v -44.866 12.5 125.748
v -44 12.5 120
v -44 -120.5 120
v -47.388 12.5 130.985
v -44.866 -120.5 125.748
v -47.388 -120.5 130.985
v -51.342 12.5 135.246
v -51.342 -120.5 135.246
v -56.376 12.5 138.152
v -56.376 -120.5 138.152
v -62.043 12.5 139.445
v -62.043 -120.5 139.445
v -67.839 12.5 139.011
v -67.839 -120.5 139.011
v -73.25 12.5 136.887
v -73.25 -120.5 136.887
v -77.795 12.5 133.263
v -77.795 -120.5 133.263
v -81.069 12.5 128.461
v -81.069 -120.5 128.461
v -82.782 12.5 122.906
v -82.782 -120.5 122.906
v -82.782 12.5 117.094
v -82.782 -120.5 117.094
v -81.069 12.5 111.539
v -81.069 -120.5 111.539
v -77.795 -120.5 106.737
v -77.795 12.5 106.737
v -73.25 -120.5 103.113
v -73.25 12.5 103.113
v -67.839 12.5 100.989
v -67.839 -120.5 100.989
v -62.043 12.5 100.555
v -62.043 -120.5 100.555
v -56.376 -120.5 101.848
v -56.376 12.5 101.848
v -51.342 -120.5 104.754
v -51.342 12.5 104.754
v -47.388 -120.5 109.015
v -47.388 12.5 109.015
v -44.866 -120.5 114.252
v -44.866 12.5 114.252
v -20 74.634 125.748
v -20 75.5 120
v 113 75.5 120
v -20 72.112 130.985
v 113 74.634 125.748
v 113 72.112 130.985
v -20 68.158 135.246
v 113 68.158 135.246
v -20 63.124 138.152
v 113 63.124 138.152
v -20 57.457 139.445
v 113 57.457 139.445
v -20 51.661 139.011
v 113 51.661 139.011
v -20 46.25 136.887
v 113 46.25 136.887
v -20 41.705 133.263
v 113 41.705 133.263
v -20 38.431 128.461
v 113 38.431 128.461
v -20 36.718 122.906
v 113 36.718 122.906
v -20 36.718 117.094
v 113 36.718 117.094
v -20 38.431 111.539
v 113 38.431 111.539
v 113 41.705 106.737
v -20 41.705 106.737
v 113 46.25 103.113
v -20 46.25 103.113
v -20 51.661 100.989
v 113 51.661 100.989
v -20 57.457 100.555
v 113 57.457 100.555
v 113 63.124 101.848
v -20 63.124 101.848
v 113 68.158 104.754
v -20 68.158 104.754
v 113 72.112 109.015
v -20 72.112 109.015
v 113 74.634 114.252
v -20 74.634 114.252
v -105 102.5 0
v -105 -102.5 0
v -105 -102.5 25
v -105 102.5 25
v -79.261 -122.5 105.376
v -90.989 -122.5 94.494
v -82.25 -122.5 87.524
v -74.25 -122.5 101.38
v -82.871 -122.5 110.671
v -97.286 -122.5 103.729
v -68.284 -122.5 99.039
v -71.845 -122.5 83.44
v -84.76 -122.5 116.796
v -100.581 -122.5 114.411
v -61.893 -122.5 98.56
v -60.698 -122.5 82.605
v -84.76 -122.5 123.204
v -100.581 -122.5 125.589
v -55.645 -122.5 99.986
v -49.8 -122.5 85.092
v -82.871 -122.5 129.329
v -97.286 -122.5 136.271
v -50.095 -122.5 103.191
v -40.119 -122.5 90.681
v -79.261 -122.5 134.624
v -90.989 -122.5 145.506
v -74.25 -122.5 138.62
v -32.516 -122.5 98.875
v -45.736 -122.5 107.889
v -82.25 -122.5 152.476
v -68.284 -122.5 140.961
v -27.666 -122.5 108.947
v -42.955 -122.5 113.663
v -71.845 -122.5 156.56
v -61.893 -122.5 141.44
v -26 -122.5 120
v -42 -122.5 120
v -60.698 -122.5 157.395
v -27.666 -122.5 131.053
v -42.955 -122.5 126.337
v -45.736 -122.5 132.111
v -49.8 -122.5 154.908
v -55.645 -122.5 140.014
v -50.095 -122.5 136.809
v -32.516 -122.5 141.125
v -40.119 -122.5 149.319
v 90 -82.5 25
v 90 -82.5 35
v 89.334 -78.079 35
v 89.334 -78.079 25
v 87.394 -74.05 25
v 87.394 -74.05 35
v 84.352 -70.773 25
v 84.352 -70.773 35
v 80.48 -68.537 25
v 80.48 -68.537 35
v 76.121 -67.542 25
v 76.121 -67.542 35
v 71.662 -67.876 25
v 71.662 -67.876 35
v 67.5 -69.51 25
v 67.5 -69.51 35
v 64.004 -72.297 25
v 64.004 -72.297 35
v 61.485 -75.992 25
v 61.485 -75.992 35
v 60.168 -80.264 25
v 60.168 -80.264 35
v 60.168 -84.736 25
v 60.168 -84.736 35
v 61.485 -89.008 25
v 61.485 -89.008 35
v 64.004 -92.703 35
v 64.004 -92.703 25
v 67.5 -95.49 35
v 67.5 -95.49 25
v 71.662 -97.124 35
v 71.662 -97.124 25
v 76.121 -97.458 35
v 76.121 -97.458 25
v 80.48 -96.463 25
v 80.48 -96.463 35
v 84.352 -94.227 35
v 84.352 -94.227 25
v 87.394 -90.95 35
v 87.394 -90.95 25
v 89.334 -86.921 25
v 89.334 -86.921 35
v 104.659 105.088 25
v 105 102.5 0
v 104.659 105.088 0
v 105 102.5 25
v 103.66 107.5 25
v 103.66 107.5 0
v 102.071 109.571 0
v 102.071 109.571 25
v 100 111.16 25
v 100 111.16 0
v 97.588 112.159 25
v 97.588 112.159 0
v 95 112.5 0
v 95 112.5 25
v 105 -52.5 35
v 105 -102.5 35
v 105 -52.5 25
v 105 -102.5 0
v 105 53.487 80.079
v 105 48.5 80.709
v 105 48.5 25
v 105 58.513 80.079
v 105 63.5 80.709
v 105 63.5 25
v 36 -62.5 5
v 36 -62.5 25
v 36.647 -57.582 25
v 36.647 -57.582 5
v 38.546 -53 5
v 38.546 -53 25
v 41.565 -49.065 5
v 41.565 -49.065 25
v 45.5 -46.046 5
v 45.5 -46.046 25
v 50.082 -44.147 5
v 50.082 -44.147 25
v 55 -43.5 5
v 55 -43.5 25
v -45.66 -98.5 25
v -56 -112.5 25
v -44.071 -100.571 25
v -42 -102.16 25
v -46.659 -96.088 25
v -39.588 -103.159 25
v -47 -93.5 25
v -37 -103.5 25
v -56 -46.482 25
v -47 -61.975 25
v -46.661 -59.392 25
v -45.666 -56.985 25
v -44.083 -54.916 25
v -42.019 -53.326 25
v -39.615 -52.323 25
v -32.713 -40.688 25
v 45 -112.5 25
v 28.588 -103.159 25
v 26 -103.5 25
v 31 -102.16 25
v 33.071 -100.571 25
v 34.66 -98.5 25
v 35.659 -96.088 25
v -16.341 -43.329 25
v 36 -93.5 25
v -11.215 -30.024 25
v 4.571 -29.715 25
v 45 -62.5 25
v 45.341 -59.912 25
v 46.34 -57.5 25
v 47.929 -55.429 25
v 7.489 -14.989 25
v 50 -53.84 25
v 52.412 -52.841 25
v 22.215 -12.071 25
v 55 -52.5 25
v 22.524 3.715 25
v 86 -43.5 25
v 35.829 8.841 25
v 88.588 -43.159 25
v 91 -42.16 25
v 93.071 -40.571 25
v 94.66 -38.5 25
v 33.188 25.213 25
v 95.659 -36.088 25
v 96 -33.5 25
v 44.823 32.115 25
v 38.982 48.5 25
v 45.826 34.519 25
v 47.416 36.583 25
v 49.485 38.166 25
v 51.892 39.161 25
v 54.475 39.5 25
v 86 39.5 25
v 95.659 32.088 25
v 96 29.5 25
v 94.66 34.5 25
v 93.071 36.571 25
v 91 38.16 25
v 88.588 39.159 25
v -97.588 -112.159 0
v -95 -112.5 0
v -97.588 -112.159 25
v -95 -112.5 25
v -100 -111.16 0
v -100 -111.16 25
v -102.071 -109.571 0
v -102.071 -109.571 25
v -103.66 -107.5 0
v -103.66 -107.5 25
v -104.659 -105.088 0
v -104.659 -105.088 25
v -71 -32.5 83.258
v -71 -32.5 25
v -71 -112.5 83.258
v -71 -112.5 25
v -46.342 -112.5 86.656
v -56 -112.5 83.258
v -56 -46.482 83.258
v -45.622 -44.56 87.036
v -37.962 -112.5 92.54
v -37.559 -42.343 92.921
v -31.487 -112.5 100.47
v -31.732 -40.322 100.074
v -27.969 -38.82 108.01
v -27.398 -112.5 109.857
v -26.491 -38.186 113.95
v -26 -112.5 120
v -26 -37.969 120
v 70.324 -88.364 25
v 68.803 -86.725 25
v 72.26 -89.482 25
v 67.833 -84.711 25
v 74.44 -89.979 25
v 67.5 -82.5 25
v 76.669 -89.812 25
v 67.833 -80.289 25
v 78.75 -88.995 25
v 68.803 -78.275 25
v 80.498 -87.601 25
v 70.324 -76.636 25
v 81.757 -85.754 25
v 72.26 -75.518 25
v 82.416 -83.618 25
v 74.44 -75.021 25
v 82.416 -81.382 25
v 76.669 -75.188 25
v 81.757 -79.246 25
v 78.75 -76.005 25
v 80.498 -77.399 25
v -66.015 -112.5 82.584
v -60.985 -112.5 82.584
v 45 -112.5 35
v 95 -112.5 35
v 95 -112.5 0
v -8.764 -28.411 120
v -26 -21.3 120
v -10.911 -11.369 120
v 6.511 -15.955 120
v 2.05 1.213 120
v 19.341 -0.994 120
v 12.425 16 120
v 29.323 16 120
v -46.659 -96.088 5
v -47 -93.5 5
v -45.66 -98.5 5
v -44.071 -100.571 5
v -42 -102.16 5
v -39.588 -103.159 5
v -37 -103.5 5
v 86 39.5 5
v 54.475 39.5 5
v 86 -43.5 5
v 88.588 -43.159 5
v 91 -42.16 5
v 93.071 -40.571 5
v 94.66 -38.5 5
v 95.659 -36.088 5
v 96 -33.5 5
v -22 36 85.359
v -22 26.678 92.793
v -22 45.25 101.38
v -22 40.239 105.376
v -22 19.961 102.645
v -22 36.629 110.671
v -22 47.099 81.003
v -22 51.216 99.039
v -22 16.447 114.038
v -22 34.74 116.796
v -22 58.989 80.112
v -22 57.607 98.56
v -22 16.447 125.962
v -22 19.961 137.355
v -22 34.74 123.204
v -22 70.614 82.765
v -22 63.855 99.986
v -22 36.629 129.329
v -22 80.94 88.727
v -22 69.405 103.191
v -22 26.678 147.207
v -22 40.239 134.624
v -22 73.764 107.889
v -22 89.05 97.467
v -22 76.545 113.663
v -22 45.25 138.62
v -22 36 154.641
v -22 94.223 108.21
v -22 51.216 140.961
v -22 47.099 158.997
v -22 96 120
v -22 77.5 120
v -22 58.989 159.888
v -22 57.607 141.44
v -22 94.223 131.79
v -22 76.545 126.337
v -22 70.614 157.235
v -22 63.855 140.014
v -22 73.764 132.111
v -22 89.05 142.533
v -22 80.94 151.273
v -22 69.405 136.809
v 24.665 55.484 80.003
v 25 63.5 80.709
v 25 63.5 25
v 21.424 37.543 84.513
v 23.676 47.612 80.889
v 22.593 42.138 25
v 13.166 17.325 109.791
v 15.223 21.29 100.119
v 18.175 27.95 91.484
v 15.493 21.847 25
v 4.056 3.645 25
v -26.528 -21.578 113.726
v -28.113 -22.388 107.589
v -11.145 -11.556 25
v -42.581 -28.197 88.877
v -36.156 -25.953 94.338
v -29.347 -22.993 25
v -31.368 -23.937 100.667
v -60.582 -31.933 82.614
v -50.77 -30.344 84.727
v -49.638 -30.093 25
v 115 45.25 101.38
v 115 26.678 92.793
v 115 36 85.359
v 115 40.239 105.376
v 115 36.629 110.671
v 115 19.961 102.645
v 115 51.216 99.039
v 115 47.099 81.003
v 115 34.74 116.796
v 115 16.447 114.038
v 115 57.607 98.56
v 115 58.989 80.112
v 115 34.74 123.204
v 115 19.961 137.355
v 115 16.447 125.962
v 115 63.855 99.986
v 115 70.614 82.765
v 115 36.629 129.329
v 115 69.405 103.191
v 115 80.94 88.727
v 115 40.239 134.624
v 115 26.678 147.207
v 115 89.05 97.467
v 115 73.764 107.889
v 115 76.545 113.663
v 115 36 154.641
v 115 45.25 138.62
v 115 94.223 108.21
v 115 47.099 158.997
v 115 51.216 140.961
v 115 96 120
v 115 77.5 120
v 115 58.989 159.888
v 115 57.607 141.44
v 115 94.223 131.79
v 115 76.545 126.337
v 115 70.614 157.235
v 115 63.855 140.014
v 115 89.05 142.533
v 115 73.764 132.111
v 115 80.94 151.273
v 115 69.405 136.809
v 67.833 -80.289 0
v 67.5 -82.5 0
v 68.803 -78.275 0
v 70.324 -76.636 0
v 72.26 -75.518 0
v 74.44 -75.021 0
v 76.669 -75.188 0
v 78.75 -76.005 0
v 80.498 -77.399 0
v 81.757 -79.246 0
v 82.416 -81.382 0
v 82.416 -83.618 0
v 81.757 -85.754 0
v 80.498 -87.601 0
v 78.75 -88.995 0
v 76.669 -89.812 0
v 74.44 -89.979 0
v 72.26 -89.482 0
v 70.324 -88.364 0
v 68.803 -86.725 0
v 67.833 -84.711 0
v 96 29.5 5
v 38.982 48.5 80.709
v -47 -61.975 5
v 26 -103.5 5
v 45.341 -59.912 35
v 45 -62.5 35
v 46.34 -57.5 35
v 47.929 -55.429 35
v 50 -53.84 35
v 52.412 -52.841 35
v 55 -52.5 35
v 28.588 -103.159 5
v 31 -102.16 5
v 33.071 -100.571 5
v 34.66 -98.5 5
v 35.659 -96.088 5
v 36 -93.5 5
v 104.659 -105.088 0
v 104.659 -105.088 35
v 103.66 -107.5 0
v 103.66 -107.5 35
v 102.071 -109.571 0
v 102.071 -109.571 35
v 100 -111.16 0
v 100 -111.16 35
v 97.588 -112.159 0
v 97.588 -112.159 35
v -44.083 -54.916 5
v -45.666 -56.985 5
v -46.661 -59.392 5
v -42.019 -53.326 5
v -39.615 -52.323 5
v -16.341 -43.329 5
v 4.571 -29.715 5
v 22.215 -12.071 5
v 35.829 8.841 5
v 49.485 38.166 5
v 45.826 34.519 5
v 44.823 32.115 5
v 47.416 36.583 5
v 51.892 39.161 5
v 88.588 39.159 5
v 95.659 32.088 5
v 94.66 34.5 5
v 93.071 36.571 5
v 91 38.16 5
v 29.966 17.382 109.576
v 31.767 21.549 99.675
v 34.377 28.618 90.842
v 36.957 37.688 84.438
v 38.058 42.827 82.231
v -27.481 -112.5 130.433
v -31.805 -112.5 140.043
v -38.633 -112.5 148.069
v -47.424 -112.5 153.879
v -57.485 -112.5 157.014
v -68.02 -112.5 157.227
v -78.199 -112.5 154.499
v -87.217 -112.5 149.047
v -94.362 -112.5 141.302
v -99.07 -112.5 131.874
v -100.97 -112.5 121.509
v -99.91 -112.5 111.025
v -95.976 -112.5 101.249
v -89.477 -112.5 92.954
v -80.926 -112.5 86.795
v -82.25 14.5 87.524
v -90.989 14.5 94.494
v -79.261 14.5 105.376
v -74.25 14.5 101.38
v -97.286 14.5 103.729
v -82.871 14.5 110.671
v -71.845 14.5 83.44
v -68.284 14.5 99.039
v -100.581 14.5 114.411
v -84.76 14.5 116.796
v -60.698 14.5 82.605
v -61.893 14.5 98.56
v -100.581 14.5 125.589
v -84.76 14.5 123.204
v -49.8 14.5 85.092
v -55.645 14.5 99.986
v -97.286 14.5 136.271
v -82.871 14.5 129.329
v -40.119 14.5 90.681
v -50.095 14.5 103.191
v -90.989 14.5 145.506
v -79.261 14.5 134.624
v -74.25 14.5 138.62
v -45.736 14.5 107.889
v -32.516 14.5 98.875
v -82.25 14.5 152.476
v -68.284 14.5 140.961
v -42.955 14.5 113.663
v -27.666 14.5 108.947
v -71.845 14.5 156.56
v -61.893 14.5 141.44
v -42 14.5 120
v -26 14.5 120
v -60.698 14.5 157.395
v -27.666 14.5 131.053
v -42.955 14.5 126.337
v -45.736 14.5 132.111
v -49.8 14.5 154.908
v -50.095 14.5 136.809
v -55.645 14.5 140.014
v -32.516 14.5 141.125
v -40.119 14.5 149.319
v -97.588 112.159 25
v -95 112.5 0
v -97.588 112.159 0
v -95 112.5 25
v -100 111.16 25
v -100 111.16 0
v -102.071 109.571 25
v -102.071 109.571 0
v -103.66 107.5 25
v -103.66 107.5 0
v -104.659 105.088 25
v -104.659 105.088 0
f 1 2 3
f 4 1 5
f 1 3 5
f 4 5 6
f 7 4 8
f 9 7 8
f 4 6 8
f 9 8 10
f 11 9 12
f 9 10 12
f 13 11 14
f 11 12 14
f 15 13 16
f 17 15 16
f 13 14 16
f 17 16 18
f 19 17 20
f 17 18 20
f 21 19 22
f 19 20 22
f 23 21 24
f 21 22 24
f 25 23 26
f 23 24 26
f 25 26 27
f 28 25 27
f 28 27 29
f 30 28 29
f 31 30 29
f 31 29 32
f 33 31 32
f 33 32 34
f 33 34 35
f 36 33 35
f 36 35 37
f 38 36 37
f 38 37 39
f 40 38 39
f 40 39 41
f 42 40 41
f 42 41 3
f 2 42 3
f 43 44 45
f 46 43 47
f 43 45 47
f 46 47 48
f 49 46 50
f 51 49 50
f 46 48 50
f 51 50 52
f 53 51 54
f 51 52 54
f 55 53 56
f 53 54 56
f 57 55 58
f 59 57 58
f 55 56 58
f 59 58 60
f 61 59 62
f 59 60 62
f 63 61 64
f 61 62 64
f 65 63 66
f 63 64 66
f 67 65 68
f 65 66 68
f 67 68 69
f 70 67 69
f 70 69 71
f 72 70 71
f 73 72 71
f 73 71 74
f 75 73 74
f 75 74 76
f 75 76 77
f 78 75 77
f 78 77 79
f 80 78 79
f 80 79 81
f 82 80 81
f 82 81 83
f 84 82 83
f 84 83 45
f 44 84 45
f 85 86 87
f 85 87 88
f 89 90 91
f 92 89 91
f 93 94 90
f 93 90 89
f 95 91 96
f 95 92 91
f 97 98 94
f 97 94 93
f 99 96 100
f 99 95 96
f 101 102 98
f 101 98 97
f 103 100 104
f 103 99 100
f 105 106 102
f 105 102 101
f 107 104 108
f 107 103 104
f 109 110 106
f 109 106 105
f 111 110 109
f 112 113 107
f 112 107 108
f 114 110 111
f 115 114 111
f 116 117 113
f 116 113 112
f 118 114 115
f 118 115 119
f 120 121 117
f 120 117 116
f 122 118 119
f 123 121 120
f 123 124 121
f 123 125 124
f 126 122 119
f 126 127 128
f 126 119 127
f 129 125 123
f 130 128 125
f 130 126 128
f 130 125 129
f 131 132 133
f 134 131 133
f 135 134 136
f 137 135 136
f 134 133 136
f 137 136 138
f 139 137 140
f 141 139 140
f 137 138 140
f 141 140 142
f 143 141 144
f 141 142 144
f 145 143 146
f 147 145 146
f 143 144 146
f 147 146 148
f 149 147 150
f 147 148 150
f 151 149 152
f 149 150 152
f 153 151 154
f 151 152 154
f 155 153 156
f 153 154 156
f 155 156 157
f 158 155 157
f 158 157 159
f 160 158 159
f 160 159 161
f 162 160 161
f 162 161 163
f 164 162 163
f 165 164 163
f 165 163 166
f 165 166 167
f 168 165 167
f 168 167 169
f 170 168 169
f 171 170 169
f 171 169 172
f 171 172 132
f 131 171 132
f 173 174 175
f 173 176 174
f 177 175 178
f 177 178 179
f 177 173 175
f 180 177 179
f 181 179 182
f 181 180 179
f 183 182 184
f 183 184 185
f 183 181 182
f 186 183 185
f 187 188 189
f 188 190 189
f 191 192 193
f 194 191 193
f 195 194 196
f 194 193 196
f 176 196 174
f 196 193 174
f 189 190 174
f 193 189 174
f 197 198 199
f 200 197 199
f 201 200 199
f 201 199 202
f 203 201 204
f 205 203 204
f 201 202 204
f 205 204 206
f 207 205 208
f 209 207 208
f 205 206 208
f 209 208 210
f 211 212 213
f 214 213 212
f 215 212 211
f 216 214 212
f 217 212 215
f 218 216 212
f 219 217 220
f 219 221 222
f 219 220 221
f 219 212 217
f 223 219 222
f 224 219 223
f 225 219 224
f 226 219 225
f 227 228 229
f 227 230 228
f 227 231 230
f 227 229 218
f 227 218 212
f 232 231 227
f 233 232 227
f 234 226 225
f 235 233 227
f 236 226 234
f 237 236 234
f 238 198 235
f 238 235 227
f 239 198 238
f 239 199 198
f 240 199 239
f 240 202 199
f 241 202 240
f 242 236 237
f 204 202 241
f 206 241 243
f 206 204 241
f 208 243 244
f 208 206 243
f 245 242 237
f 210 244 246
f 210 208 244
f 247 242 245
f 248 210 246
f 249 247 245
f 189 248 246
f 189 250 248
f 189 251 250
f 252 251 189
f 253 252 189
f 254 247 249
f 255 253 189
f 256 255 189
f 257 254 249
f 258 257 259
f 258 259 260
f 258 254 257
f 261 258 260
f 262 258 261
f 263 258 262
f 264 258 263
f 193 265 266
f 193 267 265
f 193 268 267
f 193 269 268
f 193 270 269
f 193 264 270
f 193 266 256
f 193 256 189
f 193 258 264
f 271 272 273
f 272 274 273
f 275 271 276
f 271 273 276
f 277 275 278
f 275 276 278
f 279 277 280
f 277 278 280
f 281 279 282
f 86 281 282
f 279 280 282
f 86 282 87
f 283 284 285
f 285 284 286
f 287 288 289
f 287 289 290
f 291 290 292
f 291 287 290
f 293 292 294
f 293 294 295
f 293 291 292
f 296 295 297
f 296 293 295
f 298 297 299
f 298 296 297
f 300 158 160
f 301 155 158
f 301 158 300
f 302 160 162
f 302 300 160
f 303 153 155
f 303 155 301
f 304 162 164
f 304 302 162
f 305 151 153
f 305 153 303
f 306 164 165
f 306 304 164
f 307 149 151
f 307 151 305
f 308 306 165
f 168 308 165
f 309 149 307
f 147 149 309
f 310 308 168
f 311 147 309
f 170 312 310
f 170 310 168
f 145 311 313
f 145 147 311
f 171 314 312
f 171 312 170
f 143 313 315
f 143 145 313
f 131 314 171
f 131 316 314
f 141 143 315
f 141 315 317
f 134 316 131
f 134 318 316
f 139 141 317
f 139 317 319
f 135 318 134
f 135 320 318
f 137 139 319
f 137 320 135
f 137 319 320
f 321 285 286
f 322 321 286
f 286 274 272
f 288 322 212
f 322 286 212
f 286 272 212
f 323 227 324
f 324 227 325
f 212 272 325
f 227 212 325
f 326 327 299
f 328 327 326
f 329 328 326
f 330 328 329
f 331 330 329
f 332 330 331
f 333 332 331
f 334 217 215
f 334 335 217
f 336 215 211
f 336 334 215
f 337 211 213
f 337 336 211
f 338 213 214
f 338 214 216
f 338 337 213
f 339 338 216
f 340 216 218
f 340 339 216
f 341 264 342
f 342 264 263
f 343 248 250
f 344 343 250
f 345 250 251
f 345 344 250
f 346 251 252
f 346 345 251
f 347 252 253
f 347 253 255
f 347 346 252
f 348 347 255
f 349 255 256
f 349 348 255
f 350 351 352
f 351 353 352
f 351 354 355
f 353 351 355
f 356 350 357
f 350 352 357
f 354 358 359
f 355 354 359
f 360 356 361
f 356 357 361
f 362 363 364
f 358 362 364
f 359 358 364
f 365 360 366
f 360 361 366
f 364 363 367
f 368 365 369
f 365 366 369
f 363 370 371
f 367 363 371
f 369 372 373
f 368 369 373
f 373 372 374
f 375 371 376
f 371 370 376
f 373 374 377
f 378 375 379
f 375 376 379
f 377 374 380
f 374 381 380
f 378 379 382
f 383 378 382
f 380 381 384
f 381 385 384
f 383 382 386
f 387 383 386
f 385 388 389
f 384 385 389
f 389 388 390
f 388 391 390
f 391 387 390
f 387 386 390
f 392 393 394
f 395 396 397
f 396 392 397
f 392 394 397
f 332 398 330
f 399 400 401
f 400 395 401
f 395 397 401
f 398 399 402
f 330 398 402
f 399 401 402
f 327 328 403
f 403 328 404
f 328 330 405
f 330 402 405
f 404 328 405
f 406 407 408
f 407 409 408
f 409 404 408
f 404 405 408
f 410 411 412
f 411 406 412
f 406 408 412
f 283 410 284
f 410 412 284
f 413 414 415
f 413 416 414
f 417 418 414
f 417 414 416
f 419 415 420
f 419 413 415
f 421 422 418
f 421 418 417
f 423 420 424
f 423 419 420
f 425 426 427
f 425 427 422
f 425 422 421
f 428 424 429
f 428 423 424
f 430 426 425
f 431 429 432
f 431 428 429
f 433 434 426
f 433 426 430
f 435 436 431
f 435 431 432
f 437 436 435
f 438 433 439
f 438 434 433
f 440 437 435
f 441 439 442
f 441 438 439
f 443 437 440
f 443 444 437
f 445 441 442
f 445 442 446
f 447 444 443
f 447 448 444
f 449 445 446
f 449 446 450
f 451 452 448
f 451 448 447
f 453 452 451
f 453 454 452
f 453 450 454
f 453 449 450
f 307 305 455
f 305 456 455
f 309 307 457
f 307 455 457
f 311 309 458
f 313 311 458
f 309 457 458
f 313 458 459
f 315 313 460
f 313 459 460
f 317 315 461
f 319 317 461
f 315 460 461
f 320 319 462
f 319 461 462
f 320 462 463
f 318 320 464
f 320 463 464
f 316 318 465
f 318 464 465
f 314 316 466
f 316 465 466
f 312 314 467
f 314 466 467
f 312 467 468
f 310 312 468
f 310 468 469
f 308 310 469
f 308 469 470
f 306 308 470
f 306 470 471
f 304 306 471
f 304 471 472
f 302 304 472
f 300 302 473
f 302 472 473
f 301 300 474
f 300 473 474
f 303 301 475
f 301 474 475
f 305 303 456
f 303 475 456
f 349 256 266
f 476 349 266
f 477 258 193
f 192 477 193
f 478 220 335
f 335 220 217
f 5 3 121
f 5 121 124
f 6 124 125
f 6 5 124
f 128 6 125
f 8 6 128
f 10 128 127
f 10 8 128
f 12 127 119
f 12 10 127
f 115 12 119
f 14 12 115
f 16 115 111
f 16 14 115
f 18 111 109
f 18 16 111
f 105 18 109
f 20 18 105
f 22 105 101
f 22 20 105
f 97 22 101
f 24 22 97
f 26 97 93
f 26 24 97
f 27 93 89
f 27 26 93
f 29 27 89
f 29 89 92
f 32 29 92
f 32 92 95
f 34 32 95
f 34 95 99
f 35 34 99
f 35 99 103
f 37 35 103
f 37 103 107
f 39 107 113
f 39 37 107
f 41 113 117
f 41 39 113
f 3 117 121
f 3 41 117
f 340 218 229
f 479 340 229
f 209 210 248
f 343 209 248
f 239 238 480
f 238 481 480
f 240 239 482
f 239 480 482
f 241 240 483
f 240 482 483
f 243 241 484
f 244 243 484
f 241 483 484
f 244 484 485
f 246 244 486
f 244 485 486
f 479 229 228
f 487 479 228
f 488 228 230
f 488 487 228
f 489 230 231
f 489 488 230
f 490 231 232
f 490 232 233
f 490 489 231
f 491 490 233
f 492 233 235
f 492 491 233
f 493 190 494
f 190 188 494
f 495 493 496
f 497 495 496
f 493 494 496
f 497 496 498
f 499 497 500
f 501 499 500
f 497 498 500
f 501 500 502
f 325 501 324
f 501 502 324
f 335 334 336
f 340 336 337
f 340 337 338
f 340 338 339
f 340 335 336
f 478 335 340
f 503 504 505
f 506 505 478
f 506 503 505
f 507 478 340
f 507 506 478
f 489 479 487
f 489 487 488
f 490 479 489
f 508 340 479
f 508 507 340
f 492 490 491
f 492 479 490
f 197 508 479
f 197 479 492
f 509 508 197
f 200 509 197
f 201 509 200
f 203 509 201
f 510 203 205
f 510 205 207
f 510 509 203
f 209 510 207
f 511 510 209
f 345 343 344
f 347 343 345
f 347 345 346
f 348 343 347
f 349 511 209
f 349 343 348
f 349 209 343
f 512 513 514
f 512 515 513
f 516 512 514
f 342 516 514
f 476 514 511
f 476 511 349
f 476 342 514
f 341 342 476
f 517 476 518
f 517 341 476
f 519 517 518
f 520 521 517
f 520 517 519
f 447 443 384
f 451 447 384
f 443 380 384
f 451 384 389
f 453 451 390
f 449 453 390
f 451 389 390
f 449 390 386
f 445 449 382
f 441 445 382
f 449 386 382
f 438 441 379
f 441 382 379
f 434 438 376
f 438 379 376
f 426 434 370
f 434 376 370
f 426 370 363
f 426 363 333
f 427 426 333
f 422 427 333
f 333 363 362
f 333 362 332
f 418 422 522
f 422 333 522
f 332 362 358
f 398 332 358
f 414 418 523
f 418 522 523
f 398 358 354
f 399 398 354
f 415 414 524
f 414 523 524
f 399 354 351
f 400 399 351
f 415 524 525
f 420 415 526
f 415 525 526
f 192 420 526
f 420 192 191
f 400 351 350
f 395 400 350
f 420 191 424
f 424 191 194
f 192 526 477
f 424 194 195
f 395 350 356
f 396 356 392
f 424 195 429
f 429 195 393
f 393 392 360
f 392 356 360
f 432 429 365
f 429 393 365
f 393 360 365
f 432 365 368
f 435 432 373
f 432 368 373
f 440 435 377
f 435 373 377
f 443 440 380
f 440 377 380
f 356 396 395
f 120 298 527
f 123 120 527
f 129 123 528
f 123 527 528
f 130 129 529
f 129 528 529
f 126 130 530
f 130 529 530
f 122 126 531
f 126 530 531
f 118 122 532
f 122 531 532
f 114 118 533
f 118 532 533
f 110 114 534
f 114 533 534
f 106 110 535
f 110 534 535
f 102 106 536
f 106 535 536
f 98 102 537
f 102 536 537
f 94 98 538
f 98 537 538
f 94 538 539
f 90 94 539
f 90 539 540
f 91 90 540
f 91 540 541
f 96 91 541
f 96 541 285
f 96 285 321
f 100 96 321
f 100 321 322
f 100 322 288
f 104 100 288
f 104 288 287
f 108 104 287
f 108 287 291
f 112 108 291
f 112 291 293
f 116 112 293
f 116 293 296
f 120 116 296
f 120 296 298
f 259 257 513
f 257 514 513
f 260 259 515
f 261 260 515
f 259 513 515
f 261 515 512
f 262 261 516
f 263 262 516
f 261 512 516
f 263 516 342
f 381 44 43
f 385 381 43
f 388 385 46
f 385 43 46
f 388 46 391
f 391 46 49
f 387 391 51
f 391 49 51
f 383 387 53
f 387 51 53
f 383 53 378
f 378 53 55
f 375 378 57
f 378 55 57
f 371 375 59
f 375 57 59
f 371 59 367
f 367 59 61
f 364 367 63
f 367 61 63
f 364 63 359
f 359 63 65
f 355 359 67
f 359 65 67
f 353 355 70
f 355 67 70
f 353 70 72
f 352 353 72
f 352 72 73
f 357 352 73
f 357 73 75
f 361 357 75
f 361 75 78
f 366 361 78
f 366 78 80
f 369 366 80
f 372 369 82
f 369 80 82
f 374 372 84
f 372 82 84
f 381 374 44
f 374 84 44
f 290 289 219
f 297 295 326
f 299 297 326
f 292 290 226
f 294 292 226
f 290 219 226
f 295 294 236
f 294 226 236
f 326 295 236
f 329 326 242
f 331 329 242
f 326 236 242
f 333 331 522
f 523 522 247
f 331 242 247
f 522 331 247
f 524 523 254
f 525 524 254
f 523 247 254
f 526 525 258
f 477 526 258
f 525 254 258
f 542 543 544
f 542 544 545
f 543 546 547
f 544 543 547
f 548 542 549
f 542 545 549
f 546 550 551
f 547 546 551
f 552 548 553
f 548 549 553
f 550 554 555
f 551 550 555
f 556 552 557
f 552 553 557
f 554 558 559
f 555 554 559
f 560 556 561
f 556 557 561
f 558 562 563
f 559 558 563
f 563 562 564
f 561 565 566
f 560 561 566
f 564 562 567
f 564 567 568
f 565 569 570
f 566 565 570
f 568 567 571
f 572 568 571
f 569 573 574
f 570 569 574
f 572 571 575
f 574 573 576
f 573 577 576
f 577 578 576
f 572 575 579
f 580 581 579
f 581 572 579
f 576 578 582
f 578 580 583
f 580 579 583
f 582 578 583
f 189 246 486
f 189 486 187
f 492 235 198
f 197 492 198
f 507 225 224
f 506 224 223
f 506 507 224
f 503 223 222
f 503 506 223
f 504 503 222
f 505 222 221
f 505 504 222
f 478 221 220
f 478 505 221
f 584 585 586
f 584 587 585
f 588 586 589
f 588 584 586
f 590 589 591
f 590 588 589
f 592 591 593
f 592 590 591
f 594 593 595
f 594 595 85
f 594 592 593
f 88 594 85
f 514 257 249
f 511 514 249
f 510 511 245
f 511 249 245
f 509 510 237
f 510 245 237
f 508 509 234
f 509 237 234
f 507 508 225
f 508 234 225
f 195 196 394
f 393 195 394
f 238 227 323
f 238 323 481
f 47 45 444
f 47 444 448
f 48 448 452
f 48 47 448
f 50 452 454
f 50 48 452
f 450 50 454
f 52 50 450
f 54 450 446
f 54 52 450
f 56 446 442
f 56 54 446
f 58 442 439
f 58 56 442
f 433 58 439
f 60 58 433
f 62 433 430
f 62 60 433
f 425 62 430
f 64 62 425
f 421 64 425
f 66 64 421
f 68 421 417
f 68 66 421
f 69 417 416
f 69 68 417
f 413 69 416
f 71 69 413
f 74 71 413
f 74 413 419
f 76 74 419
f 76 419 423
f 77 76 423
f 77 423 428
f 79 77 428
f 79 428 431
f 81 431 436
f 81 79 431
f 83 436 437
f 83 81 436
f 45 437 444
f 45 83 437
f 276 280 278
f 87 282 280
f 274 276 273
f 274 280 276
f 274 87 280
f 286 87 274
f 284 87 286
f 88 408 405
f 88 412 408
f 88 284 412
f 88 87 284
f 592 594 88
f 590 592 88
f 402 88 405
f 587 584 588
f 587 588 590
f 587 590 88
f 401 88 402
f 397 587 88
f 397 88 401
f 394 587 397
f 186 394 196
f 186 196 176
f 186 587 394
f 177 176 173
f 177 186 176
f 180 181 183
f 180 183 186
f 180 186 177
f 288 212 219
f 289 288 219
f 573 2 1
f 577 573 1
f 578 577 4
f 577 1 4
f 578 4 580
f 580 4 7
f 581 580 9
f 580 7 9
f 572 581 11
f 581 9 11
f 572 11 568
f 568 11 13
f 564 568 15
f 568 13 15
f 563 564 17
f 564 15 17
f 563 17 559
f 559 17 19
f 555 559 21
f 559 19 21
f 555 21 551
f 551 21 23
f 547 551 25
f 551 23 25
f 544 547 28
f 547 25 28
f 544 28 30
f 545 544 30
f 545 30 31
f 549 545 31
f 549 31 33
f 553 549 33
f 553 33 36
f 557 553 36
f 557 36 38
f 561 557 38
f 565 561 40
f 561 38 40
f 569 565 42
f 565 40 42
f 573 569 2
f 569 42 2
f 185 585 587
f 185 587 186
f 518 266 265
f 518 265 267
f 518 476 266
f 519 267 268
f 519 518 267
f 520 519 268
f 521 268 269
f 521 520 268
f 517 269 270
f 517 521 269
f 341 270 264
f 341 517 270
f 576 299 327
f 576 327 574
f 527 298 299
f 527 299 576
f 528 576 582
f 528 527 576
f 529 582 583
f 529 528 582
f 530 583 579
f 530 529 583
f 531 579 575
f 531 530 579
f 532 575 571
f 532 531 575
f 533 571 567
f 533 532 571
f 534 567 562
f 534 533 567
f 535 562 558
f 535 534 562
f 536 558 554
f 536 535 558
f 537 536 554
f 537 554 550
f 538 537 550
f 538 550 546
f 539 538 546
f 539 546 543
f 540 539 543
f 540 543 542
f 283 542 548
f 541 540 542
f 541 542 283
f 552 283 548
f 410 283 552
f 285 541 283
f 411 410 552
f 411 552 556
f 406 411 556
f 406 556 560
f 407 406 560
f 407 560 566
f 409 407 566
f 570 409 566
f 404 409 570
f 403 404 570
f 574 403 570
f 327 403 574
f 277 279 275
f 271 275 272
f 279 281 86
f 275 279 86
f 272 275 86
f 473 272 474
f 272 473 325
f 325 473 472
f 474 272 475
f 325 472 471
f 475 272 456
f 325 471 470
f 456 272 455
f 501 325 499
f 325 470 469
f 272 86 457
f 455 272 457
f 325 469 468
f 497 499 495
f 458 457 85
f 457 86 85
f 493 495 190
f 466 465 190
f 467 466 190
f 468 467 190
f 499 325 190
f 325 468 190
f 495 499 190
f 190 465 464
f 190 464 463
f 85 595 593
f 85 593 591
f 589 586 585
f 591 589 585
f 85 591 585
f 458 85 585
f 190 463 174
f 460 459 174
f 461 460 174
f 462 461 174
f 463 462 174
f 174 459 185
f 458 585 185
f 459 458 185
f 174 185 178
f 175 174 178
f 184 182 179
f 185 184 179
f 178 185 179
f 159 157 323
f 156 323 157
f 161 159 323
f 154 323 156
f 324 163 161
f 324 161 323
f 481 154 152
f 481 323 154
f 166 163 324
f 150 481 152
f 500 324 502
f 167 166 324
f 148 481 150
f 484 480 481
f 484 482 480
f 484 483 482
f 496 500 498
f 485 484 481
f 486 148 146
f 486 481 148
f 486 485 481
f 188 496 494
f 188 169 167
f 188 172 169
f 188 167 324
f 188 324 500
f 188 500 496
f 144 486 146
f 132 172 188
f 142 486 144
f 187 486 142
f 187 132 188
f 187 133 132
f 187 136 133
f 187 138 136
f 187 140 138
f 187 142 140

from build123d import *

# Parameters (mm, degrees)
F0_W            = 210
F0_H            = 225
F1_DEPTH        = 25
F3_DEPTH        = 95
F4_R            = 37.5
F5_DEPTH        = 10
F5_DEPTH_BACK   = 127
F6_R            = 40
F7_DEPTH        = 10
F7_DEPTH_BACK   = 127
F8_W            = 60
F8_H            = 60
F9_DEPTH        = 10
F10_R           = 10
F12_DEPTH       = 20
F14_D           = 15
F14_CBORE_D     = 30
F14_CBORE_DEPTH = 10
F15_R           = 10
F16_R           = 19.5
F17_DEPTH       = 235.001
F18_R           = 19.5
F19_DEPTH       = 220.001
F20_SIZE        = 2
F21_R           = 10


with BuildPart() as f1:
    # F0 (on Top) → F1 (new body)
    with BuildSketch(Plane.XY):
        Rectangle(F0_W, F0_H)
    extrude(amount=F1_DEPTH)

    # F2 (on face) → F3 (join)
    with BuildSketch(Plane.XY.offset(25)):
        with BuildLine():
            Line((-71, -32.5), (-71, -112.5))
            Line((-71, -112.5), (-56, -112.5))
            Line((-56, -112.5), (-56, -46.481817))
            ThreePointArc((-56, -46.481817), (7.488853, -14.988853), (38.981817, 48.5))
            Line((38.981817, 48.5), (105, 48.5))
            Line((105, 48.5), (105, 63.5))
            Line((105, 63.5), (25, 63.5))
            ThreePointArc((25, 63.5), (-3.117749, -4.382251), (-71, -32.5))
        make_face()
    extrude(amount=F3_DEPTH)

    # F4 (on face) → F5 (join, two sides)
    with BuildSketch(Plane.XZ.offset(112.5)) as f5_sk:
        with Locations((-63.5, 120)):
            Circle(F4_R)
    extrude(amount=F5_DEPTH)
    extrude(f5_sk.sketch, amount=-F5_DEPTH_BACK)

    # F6 (on face) → F7 (join, two sides)
    with BuildSketch(Plane.YZ.offset(105)) as f7_sk:
        with Locations((56, 120)):
            Circle(F6_R)
    extrude(amount=F7_DEPTH)
    extrude(f7_sk.sketch, amount=-F7_DEPTH_BACK)

    # F8 (on face) → F9 (join)
    with BuildSketch(Plane.XY.offset(25)):
        with Locations((75, -82.5)):
            Rectangle(F8_W, F8_H)
    extrude(amount=F9_DEPTH)

    # F10
    f10_edges = [f1.edges().sort_by_distance(p)[0] for p in [
        (45, -52.5, 30),
    ]]
    fillet(f10_edges, radius=F10_R)

    # F11 (on face) → F12 (cut)
    with BuildSketch(Plane.XY.offset(25)):
        with BuildLine():
            ThreePointArc((46.575508, 39.5), (13.852814, -21.352814), (-47, -54.075508))
            Line((-47, -54.075508), (-47, -103.5))
            Line((-47, -103.5), (36, -103.5))
            Line((36, -103.5), (36, -62.5))
            ThreePointArc((36, -62.5), (41.564971, -49.064971), (55, -43.5))
            Line((55, -43.5), (96, -43.5))
            Line((96, -43.5), (96, 39.5))
            Line((96, 39.5), (46.575508, 39.5))
        make_face()
    extrude(amount=-F12_DEPTH, mode=Mode.SUBTRACT)

    # F14 (through all)
    with Locations(Plane.XY.offset(35)):
        with Locations((75, -82.5)):
            CounterBoreHole(F14_D / 2, F14_CBORE_D / 2, F14_CBORE_DEPTH)

    # F15
    f15_edges = [f1.edges().sort_by_distance(p)[0] for p in [
        (46.575508, 39.5, 15),
        (-47, -54.075508, 15),
        (-47, -103.5, 15),
        (96, 39.5, 15),
        (36, -103.5, 15),
        (96, -43.5, 15),
    ]]
    fillet(f15_edges, radius=F15_R)

    # F16 (on face) → F17 (cut, through all)
    with BuildSketch(Plane.XZ.offset(122.5)):
        with Locations((-63.5, 120)):
            Circle(F16_R)
    extrude(amount=-F17_DEPTH, mode=Mode.SUBTRACT)

    # F18 (on face) → F19 (cut, through all)
    with BuildSketch(Plane.YZ.offset(115)):
        with Locations((56, 120)):
            Circle(F18_R)
    extrude(amount=-F19_DEPTH, mode=Mode.SUBTRACT)

    # F20
    f20_edges = [f1.edges().sort_by_distance(p)[0] for p in [
        (-83, -122.5, 120),
        (115, 36.5, 120),
        (-83, 14.5, 120),
        (-22, 36.5, 120),
    ]]
    chamfer(f20_edges, length=F20_SIZE)

    # F21
    f21_edges = [f1.edges().sort_by_distance(p)[0] for p in [
        (105, -112.5, 17.5),
        (105, 112.5, 12.5),
        (-105, 112.5, 12.5),
        (-105, -112.5, 12.5),
    ]]
    fillet(f21_edges, radius=F21_R)


solid = f1.part
